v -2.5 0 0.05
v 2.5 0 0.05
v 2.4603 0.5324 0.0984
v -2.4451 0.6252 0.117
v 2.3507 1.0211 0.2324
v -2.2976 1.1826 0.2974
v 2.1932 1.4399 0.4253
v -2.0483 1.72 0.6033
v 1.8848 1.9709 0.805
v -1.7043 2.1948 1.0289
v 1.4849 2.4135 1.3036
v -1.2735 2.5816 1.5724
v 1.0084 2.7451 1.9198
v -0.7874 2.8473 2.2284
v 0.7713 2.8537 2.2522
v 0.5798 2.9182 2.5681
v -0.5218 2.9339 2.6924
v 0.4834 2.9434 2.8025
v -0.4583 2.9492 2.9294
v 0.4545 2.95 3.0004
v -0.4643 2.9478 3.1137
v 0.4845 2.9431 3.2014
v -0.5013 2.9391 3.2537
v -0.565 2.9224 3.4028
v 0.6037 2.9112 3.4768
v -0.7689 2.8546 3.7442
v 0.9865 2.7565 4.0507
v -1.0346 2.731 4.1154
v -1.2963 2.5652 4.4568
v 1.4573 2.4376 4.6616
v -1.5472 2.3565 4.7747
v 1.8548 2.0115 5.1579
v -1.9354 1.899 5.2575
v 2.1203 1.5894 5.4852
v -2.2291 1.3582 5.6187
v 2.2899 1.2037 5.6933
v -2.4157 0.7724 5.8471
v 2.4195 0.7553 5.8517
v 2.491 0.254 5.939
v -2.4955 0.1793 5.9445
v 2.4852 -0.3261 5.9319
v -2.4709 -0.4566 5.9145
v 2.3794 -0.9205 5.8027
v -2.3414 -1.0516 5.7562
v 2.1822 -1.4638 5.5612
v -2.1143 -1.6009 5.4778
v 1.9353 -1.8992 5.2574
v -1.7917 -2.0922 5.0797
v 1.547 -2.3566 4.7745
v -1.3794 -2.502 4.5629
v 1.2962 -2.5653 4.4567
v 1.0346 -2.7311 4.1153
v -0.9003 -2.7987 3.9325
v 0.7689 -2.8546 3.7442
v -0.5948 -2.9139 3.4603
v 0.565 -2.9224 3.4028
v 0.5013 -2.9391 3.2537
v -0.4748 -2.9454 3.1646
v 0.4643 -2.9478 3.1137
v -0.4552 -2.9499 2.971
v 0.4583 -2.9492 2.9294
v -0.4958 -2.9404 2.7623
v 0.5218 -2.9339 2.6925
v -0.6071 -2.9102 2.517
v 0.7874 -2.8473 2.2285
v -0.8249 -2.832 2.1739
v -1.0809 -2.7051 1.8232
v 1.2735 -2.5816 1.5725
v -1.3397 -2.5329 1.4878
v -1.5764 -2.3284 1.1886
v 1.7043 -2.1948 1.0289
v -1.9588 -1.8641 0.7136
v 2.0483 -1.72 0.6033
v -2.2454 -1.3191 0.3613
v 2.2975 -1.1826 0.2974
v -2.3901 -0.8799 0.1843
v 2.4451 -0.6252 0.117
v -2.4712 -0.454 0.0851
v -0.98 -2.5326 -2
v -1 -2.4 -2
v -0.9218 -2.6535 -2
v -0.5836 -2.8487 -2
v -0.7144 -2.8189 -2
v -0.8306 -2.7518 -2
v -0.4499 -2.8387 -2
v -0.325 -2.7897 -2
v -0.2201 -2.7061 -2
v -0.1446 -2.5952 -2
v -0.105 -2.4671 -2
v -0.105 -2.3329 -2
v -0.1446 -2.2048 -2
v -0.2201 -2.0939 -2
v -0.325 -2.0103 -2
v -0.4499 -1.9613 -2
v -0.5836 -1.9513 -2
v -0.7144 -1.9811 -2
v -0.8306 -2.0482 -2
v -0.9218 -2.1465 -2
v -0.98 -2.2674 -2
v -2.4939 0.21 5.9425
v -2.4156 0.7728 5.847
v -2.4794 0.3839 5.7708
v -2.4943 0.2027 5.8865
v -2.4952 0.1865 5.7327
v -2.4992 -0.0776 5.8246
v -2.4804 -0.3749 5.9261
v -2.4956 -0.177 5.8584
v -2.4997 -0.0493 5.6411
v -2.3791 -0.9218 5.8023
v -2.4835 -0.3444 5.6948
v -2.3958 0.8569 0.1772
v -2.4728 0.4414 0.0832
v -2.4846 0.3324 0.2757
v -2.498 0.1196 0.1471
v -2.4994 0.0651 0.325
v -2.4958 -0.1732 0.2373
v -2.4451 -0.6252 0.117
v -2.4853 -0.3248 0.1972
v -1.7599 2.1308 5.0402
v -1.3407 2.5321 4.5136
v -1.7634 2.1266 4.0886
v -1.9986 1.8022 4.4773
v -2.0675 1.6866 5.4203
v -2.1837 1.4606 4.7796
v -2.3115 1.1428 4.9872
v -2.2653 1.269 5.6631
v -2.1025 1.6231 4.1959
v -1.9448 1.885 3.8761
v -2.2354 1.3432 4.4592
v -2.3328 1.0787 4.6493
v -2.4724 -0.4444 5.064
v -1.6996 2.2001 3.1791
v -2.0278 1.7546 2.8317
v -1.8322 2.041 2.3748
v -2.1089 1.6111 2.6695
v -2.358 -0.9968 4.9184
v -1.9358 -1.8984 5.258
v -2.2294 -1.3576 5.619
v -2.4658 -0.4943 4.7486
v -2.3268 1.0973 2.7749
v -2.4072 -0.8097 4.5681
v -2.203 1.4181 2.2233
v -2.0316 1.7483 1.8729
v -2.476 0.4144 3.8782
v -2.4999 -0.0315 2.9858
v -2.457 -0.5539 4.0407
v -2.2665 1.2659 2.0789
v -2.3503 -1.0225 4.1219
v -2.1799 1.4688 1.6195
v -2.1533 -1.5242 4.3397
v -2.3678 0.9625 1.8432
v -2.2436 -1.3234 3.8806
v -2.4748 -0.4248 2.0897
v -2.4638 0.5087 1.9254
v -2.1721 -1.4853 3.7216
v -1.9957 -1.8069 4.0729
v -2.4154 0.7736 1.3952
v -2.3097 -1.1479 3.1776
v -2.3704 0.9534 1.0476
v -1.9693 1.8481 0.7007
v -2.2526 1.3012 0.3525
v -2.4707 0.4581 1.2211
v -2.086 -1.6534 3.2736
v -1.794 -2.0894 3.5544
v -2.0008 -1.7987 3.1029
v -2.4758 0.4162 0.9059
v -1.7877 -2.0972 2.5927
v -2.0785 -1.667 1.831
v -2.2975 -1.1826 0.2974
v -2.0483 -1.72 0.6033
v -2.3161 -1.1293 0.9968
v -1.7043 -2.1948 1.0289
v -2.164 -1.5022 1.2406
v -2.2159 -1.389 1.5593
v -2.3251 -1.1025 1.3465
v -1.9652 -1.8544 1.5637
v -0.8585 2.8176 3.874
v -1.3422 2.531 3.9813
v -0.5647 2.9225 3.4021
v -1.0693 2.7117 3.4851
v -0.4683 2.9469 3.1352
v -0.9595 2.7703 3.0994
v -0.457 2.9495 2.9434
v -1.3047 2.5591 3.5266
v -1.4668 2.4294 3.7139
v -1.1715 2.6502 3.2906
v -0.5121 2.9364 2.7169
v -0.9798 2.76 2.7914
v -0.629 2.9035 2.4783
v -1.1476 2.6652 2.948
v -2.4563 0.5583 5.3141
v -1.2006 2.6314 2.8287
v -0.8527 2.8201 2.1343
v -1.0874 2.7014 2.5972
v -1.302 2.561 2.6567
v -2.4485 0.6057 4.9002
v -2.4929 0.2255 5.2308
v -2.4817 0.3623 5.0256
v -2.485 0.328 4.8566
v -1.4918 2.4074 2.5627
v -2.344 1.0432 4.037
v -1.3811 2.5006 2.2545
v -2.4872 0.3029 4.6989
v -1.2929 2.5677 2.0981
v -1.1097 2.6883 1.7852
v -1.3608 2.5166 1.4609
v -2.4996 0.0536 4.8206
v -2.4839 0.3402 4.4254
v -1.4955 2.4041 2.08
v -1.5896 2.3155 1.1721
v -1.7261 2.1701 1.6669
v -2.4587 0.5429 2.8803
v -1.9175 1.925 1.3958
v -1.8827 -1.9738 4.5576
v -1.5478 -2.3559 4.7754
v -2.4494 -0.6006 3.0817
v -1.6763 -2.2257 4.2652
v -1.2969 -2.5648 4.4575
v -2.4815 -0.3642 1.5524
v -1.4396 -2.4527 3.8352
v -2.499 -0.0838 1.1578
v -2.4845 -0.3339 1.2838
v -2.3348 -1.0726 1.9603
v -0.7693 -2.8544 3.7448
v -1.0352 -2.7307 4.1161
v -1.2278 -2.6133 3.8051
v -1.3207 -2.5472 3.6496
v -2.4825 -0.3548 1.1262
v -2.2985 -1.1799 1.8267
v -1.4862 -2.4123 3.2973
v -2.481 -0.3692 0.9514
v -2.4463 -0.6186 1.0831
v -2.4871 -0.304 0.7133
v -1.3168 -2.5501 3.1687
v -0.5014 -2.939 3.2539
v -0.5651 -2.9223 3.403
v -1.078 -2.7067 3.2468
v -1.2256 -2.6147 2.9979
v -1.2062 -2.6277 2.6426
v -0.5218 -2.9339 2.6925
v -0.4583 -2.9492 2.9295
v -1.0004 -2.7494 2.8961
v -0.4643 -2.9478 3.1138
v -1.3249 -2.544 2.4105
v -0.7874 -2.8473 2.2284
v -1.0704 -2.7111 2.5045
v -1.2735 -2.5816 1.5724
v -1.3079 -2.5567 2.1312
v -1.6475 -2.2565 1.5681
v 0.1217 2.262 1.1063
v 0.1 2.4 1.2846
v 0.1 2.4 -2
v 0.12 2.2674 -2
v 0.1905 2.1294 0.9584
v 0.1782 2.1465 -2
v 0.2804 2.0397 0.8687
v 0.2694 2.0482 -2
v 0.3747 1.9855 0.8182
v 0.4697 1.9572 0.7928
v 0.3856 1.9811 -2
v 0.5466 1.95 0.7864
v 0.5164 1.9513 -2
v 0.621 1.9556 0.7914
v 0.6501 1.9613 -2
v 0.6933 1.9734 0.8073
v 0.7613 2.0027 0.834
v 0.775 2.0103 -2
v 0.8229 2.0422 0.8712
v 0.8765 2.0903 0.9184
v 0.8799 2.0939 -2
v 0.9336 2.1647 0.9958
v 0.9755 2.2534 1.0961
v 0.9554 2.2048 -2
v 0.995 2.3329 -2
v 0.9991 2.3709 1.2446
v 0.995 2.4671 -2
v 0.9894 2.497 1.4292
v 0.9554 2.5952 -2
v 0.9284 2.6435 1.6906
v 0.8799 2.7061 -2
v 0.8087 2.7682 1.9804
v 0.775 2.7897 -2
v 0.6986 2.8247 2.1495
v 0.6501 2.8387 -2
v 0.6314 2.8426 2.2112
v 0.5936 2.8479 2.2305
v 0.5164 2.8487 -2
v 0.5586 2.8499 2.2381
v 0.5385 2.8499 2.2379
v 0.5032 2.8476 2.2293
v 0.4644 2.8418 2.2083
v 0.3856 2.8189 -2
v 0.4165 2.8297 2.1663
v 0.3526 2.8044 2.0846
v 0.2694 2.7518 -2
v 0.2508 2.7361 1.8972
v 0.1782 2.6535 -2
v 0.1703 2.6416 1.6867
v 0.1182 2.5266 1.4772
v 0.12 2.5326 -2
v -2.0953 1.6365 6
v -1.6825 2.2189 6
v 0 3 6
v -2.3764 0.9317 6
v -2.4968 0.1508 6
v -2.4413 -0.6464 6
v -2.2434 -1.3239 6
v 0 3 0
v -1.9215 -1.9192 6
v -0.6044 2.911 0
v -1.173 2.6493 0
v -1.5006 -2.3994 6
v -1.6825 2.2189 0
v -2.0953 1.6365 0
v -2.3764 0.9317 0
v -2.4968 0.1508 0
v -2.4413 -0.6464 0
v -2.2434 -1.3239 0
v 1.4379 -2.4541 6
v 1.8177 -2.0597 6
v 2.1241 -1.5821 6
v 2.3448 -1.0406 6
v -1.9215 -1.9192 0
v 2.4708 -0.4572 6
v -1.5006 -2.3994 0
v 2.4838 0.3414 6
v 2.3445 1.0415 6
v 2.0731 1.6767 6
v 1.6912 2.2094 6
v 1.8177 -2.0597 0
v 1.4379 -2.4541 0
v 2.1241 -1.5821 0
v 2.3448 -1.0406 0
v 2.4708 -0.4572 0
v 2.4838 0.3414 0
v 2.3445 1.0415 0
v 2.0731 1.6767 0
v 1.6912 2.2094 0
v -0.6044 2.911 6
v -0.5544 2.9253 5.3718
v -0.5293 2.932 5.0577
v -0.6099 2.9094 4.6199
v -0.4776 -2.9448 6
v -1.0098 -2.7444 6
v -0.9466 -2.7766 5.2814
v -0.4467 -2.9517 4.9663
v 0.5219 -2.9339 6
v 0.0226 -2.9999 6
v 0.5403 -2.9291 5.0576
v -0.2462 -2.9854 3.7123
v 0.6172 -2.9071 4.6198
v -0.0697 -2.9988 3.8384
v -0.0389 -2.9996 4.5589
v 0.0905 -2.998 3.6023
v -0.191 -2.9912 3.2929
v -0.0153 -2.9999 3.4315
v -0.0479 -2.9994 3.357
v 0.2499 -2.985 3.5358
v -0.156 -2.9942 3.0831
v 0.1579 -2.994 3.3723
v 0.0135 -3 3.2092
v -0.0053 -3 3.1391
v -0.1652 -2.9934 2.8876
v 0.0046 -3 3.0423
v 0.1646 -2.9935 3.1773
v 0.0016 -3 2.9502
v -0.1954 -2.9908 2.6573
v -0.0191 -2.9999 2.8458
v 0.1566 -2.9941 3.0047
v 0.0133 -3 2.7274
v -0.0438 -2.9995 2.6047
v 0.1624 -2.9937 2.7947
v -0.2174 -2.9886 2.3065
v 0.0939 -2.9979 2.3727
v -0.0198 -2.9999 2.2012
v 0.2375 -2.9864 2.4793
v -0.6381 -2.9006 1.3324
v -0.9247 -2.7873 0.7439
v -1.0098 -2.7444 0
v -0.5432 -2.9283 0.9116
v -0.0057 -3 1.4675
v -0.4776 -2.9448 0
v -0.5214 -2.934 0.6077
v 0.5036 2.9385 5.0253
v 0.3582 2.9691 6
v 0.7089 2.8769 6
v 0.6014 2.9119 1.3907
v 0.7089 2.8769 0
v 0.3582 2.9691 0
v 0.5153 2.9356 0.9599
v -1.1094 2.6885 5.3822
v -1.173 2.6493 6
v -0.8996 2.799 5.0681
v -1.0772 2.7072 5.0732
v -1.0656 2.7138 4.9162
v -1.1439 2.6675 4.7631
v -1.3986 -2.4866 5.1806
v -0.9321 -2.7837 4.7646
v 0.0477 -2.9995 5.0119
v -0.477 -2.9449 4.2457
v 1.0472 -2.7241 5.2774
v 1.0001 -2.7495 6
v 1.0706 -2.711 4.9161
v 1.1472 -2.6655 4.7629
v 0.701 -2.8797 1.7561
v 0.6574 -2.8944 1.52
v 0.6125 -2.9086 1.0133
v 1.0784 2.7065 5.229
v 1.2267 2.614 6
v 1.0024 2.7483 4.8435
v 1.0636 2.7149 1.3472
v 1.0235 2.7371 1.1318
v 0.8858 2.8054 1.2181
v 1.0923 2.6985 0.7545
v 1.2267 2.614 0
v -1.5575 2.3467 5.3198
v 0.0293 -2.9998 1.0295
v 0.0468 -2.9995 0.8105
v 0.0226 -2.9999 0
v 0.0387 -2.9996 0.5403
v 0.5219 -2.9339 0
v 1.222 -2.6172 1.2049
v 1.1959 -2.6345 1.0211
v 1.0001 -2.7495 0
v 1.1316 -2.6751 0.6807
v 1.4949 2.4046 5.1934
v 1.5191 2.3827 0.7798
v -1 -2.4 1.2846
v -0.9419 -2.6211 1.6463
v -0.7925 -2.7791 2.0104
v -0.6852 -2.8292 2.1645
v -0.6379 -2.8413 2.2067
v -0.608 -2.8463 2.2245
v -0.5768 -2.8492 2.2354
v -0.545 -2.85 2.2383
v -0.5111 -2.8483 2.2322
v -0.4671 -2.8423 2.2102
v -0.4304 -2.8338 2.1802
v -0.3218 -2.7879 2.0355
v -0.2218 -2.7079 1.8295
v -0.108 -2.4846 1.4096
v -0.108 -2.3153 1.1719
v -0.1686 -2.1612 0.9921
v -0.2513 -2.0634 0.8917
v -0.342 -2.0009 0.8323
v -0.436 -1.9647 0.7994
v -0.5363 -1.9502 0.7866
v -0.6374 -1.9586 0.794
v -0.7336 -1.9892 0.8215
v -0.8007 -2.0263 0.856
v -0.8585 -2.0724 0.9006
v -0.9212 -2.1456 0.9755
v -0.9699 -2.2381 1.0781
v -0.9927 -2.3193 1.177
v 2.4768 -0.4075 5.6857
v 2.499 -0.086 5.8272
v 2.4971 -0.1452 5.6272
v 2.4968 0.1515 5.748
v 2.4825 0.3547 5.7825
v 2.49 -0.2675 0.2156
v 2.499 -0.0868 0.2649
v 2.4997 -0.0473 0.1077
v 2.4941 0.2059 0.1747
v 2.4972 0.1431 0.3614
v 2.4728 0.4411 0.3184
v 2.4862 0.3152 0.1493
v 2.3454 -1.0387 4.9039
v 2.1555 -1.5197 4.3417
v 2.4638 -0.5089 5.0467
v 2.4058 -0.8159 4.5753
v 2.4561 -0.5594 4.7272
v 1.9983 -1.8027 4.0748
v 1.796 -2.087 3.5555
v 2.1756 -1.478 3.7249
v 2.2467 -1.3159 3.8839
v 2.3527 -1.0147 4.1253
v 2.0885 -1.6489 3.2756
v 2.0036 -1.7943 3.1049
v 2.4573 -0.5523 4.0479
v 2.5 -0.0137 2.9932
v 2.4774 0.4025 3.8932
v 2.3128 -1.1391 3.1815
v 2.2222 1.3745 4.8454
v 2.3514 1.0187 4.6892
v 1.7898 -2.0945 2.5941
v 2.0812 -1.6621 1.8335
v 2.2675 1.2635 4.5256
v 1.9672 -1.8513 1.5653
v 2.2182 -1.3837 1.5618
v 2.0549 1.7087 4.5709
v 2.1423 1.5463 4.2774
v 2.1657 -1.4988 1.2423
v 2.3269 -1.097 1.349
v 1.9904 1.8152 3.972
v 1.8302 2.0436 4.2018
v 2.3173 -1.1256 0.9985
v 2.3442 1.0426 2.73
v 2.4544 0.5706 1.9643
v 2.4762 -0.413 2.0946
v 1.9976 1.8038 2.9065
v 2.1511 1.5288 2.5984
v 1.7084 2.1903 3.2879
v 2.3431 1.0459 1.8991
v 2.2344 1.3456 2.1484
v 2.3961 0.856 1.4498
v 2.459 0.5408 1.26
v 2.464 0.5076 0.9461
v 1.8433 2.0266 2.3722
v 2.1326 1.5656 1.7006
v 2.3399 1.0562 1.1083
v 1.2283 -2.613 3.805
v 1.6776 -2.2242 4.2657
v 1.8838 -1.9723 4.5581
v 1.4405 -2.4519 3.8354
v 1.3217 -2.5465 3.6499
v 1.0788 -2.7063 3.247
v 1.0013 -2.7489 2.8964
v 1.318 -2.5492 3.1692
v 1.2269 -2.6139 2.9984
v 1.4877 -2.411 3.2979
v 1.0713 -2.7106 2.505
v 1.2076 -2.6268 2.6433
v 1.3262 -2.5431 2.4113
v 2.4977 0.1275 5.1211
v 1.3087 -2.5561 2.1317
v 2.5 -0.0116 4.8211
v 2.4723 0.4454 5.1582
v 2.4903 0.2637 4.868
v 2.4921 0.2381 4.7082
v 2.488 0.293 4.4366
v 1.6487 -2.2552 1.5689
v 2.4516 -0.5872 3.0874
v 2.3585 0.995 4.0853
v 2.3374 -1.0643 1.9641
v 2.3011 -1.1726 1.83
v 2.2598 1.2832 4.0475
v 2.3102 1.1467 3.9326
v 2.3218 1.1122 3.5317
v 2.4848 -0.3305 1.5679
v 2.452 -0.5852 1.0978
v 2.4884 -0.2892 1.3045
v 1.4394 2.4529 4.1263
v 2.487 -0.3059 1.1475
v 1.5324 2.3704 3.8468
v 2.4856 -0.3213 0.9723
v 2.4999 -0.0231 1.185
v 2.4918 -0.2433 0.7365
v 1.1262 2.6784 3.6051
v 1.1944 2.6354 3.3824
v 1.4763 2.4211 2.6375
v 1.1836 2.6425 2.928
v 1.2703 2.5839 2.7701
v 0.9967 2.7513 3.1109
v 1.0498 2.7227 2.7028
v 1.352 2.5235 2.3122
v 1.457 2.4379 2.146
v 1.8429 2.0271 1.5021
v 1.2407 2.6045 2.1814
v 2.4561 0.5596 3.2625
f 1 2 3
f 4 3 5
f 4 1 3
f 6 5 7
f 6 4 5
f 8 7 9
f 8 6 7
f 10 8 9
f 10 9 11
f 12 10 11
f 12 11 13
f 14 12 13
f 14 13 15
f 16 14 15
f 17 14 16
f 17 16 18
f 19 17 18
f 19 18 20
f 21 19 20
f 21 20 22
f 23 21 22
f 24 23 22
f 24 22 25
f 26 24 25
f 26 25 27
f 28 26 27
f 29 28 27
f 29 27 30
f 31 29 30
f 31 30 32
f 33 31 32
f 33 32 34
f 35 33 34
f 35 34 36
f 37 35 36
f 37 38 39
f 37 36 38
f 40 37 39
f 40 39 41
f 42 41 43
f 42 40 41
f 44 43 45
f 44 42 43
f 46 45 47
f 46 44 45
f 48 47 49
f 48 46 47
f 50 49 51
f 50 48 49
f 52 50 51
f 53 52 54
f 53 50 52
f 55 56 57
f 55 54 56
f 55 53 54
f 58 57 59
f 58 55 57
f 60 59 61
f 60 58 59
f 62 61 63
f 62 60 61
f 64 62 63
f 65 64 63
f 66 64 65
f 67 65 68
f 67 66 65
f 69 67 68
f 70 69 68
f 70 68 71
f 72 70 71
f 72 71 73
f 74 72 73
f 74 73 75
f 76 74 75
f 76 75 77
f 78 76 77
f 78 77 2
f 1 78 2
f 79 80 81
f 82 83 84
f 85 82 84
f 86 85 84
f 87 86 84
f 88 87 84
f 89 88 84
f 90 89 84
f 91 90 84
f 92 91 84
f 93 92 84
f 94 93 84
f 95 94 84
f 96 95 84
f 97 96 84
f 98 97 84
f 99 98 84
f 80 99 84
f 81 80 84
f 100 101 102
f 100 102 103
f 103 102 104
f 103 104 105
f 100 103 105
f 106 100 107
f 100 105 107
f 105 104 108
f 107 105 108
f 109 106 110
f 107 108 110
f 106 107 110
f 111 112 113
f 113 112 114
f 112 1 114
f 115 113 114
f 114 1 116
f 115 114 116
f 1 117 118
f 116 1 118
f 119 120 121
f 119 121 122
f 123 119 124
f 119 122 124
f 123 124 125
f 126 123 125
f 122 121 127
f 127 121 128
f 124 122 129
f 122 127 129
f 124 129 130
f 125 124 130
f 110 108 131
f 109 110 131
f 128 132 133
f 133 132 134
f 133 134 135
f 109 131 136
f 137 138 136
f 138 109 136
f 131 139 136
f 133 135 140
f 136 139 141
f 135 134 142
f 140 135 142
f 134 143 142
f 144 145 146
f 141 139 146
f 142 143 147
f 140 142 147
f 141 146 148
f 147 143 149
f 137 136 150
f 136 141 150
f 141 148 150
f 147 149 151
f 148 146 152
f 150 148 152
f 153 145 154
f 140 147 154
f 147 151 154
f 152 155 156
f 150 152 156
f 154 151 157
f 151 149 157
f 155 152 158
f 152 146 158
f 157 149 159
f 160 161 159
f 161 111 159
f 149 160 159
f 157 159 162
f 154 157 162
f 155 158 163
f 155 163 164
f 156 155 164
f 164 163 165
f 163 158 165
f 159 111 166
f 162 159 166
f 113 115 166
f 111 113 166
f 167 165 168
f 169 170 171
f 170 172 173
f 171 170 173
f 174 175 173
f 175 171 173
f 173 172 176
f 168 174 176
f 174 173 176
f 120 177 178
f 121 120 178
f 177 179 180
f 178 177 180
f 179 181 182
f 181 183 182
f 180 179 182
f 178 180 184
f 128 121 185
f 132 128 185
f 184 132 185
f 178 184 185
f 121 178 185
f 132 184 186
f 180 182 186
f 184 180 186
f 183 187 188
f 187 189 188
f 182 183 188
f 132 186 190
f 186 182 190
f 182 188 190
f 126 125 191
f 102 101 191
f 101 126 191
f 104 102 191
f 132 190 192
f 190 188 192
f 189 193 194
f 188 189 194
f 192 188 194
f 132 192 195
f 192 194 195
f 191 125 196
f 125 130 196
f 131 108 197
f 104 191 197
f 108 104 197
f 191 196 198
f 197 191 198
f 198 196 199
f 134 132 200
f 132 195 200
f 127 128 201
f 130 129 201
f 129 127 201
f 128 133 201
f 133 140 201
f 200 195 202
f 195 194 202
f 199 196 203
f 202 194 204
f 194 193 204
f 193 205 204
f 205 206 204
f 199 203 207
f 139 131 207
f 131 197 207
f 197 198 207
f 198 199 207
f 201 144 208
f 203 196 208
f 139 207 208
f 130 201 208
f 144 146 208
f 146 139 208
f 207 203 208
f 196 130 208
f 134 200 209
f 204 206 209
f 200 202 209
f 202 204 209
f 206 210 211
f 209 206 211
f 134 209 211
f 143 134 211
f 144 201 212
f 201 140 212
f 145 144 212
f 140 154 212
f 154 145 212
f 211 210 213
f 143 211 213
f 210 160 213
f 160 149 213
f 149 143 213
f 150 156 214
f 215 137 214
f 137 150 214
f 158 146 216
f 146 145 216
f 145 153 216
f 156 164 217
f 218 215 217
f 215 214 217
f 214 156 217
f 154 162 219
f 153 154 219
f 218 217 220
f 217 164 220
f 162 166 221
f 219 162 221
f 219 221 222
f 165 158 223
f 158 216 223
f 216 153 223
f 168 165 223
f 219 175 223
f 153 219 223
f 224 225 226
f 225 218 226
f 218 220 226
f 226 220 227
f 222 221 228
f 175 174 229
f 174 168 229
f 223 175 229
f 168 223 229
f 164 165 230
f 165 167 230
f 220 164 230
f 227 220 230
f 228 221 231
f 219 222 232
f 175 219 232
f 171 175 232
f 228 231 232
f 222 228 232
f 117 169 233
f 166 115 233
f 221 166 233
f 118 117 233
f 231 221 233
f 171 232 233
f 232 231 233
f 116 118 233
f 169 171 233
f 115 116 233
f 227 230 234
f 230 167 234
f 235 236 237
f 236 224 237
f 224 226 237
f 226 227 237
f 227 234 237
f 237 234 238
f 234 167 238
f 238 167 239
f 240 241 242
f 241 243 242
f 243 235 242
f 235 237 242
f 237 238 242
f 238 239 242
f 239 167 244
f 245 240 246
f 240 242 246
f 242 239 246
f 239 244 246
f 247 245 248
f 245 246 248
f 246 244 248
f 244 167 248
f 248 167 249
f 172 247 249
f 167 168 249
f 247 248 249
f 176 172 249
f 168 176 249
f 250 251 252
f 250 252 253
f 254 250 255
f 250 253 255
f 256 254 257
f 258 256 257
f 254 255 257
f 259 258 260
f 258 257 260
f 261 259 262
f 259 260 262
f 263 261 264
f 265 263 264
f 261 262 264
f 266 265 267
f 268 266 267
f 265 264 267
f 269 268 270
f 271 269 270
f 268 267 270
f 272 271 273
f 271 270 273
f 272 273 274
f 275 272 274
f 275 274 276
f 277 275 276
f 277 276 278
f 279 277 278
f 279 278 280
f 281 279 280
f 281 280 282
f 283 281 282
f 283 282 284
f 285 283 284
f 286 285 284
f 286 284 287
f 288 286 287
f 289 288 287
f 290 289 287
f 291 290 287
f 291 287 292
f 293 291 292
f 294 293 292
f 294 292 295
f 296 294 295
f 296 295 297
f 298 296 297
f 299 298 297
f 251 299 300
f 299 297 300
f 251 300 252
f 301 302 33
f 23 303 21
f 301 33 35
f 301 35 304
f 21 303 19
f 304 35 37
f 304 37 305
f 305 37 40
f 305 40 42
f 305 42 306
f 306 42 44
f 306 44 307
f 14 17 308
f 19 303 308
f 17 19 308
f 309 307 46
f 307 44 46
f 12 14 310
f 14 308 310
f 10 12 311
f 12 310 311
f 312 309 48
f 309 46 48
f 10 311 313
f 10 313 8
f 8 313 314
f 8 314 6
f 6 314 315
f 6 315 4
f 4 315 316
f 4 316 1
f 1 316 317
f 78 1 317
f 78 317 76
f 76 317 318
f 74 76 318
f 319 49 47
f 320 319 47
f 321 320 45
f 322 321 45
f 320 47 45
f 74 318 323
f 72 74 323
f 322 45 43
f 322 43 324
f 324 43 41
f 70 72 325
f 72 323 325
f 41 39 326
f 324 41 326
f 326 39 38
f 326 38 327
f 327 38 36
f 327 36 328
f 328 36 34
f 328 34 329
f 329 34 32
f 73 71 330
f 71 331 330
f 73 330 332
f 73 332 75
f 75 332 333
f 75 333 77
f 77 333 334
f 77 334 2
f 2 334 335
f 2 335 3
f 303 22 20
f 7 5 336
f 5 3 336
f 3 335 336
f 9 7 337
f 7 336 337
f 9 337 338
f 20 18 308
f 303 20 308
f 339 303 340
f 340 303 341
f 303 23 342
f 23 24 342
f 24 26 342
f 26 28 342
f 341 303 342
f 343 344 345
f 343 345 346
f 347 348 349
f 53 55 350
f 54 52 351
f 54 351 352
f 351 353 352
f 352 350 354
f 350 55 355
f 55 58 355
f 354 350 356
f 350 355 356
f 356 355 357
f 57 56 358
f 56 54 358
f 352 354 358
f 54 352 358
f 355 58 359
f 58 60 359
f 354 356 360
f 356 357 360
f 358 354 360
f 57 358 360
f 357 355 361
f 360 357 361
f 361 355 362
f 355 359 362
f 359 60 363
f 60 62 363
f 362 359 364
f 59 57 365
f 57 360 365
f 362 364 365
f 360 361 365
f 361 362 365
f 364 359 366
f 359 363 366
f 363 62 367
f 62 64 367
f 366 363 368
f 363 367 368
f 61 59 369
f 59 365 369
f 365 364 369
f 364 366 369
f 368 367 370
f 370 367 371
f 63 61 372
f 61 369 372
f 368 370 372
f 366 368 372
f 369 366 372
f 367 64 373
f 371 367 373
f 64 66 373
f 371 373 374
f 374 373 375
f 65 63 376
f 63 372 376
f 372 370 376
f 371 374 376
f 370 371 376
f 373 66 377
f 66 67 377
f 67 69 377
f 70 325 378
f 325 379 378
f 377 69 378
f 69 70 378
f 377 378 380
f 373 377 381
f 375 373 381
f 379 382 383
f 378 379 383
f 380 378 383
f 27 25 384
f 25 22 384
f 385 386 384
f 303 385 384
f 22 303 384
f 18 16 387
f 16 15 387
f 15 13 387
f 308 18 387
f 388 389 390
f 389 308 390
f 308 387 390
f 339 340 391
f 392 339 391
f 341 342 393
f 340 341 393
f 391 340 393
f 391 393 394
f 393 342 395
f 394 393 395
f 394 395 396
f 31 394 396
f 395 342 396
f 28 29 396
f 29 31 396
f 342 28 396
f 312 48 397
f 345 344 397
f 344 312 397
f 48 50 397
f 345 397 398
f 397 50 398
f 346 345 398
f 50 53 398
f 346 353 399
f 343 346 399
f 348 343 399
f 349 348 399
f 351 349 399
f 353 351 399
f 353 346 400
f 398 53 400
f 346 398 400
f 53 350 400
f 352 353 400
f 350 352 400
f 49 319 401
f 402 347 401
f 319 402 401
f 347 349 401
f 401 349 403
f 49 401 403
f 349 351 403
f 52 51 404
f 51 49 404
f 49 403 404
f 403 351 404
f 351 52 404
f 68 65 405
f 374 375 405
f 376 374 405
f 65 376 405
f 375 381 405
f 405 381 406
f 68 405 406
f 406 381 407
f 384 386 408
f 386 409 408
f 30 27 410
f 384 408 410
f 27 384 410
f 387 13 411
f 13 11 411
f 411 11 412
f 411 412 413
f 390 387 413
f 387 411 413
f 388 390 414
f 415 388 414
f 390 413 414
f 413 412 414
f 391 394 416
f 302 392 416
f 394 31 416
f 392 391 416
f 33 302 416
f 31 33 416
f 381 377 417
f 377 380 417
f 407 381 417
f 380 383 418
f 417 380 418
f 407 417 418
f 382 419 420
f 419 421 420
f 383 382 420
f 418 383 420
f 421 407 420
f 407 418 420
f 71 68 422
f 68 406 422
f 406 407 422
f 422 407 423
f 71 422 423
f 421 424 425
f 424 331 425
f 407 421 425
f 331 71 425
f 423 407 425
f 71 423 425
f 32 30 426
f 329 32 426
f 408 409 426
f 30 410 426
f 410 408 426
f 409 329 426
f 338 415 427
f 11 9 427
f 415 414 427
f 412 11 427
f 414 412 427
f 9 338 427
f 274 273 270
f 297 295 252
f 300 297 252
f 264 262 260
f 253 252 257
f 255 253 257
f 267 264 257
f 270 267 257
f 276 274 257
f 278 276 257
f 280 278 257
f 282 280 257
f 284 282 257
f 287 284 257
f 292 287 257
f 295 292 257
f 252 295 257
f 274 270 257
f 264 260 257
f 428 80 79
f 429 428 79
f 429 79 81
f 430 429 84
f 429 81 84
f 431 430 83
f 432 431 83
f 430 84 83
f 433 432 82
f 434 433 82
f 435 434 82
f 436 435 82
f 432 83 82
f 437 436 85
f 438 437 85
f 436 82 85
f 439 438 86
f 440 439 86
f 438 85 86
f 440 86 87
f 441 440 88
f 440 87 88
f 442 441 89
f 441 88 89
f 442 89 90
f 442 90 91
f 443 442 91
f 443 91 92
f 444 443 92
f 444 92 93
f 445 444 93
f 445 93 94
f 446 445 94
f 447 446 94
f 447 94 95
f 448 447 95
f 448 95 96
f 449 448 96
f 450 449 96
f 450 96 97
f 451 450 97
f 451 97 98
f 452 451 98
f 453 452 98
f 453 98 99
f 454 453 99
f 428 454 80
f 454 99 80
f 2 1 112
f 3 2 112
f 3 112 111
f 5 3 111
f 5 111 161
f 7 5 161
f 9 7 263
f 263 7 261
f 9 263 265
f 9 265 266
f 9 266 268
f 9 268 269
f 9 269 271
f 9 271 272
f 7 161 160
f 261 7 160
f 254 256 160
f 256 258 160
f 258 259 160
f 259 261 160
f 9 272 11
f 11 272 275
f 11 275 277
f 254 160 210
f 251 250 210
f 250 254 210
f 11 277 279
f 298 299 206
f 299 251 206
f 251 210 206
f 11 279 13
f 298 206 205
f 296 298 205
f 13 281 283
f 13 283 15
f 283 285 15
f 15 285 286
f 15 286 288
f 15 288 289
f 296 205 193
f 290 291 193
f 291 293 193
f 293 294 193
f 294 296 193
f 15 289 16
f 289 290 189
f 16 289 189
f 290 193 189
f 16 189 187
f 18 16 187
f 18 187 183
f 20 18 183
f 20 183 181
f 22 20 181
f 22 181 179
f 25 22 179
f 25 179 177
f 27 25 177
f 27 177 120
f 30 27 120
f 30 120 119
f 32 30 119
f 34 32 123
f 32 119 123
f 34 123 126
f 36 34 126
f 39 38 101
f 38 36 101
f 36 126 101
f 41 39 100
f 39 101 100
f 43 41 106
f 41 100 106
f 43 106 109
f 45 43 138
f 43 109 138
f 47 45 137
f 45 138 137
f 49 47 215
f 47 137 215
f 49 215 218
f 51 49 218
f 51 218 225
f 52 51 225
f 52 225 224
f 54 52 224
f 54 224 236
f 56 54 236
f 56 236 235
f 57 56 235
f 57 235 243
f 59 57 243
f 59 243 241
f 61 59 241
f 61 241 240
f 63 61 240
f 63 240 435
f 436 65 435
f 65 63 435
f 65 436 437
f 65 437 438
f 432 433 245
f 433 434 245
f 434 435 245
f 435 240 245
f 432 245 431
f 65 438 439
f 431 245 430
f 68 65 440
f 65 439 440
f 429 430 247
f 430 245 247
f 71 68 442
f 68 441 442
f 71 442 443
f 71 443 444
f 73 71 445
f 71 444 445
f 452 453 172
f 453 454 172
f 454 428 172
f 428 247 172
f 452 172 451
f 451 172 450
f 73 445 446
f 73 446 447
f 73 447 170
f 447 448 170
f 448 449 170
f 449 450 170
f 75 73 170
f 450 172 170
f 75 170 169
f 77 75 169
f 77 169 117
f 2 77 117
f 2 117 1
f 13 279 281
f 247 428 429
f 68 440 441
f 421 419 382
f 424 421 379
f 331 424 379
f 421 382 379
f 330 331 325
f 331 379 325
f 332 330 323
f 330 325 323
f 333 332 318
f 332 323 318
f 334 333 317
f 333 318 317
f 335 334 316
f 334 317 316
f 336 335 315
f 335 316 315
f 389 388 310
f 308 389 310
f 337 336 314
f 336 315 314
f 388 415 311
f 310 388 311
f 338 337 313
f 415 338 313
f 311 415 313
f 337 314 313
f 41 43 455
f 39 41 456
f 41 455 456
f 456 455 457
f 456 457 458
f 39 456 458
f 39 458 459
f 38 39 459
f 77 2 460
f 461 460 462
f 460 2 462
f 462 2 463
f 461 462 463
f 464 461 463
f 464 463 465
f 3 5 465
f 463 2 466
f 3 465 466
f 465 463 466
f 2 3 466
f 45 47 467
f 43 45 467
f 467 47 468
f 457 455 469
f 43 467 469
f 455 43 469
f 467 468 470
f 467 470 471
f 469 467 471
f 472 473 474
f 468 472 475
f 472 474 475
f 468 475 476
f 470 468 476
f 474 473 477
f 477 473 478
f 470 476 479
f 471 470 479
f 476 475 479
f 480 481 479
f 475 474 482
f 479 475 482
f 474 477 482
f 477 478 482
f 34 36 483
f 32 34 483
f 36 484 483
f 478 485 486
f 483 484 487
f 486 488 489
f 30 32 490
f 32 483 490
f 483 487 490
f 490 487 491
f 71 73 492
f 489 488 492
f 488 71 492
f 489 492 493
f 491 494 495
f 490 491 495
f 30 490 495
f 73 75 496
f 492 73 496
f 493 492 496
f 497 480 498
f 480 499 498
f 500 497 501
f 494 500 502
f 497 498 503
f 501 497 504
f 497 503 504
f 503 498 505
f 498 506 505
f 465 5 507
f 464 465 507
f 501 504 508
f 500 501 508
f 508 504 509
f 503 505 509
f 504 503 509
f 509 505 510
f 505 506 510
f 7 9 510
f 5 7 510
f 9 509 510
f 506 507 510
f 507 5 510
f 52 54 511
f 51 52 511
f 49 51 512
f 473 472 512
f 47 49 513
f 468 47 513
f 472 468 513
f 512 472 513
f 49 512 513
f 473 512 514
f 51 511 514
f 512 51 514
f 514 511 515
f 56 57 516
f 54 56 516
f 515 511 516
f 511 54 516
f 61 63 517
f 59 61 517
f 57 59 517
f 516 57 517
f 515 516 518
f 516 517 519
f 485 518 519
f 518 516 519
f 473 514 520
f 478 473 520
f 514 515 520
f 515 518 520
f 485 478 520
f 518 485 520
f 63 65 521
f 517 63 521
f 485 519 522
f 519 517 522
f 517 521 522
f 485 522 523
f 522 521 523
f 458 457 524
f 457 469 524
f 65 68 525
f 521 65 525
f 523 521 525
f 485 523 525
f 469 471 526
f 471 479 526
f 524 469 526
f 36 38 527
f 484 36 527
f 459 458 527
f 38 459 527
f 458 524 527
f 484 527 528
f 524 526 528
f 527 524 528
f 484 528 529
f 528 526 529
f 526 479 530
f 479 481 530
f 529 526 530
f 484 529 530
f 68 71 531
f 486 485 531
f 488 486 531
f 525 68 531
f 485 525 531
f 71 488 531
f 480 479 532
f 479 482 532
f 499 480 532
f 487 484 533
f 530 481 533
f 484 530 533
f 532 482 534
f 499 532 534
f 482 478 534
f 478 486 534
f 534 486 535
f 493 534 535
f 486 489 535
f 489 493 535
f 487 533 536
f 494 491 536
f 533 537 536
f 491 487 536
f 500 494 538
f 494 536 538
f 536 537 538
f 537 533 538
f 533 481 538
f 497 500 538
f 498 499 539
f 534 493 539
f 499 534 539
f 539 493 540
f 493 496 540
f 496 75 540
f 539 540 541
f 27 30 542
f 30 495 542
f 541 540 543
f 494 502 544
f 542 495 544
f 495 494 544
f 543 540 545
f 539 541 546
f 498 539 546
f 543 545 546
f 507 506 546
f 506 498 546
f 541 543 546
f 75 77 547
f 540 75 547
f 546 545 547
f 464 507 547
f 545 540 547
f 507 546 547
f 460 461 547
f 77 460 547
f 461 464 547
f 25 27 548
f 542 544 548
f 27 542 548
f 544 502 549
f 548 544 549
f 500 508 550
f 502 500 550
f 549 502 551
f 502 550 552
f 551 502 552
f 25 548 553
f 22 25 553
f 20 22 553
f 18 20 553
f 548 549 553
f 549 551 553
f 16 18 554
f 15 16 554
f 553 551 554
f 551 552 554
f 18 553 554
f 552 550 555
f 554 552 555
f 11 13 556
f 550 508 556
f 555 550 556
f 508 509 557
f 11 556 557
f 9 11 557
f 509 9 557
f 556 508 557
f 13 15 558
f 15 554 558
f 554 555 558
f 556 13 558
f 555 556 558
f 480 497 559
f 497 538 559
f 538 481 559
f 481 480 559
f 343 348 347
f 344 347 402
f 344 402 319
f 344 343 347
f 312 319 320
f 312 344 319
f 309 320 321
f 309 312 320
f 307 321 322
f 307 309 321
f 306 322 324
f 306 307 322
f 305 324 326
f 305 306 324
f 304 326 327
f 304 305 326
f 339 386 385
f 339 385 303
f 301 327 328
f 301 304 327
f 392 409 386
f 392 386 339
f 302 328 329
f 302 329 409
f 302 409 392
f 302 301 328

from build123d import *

# Parameters (mm, degrees)
ESQUISSE1_RX                 = 3
ESQUISSE1_RY                 = 2.5
EXTRUSION1_DEPTH             = 6
FRACTIONNER3_SURFACE_1_BACK  = 10.849
FRACTIONNER3_SURFACE_1_DEPTH = 21.698
FRACTIONNER3_SURFACE_2_BACK  = 10.849
FRACTIONNER3_SURFACE_2_DEPTH = 21.698
EXTRUSION3_REACH             = 10.902
ESQUISSE3_R                  = 0.45


with BuildPart() as part:
    # Esquisse1 → Extrusion1 (new body)
    with BuildSketch(Plane.XY):
        with Locations(Location((0, 0), (0, 0, 90))):
            Ellipse(ESQUISSE1_RX, ESQUISSE1_RY)
    extrude(amount=EXTRUSION1_DEPTH)


with BuildPart() as body_2:
    # Fractionner3: the piece behind the surface
    add(part.part)
    # Fractionner3 surface: a surface, the sketch's curves swept straight by 21.698 mm
    with BuildLine(Plane(origin=(0, 0, 0), x_dir=(0, 0, -1), z_dir=(1, 0, 0)).offset(-FRACTIONNER3_SURFACE_1_BACK), mode=Mode.PRIVATE) as fractionner3_surface_1_path:
        CenterArc((-3, 0), 2.95, 0, 360)
    fractionner3_surface_1 = Shell.extrude(fractionner3_surface_1_path.wire(), (1 * FRACTIONNER3_SURFACE_1_DEPTH, 0 * FRACTIONNER3_SURFACE_1_DEPTH, 0 * FRACTIONNER3_SURFACE_1_DEPTH))
    split(bisect_by=fractionner3_surface_1, keep=Keep.BOTTOM)


with BuildPart() as part_1:
    add(part.part)

    # Fractionner3: split by a surface, the side it looks to stays
    # Fractionner3 surface: a surface, the sketch's curves swept straight by 21.698 mm
    with BuildLine(Plane(origin=(0, 0, 0), x_dir=(0, 0, -1), z_dir=(1, 0, 0)).offset(-FRACTIONNER3_SURFACE_2_BACK), mode=Mode.PRIVATE) as fractionner3_surface_2_path:
        CenterArc((-3, 0), 2.95, 0, 360)
    fractionner3_surface_2 = Shell.extrude(fractionner3_surface_2_path.wire(), (1 * FRACTIONNER3_SURFACE_2_DEPTH, 0 * FRACTIONNER3_SURFACE_2_DEPTH, 0 * FRACTIONNER3_SURFACE_2_DEPTH))
    split(bisect_by=fractionner3_surface_2, keep=Keep.TOP)

    # Esquisse3 → Extrusion3 (add, up to next)
    with BuildSketch(Plane.XY.offset(-2), mode=Mode.PRIVATE) as extrusion3_sk1:
        with Locations(Location((0.55, 2.4, 0), (0, 0, 180))):
            Circle(ESQUISSE3_R)
    extrusion3_tool1 = extrude(extrusion3_sk1.sketch, amount=EXTRUSION3_REACH, mode=Mode.PRIVATE) - part_1.part
    # Esquisse3 → Extrusion3 (add, up to next)
    with BuildSketch(Plane.XY.offset(-2), mode=Mode.PRIVATE) as extrusion3_sk2:
        with Locations(Location((-0.55, -2.4, 0), (0, 0, 180))):
            Circle(ESQUISSE3_R)
    extrusion3_tool2 = extrude(extrusion3_sk2.sketch, amount=EXTRUSION3_REACH, mode=Mode.PRIVATE) - part_1.part
    add(extrusion3_tool1.solids().sort_by_distance((0.55, 2.4, -2))[0])
    add(extrusion3_tool2.solids().sort_by_distance((-0.55, -2.4, -2))[0])


solid = Compound([body_2.part, part_1.part])
